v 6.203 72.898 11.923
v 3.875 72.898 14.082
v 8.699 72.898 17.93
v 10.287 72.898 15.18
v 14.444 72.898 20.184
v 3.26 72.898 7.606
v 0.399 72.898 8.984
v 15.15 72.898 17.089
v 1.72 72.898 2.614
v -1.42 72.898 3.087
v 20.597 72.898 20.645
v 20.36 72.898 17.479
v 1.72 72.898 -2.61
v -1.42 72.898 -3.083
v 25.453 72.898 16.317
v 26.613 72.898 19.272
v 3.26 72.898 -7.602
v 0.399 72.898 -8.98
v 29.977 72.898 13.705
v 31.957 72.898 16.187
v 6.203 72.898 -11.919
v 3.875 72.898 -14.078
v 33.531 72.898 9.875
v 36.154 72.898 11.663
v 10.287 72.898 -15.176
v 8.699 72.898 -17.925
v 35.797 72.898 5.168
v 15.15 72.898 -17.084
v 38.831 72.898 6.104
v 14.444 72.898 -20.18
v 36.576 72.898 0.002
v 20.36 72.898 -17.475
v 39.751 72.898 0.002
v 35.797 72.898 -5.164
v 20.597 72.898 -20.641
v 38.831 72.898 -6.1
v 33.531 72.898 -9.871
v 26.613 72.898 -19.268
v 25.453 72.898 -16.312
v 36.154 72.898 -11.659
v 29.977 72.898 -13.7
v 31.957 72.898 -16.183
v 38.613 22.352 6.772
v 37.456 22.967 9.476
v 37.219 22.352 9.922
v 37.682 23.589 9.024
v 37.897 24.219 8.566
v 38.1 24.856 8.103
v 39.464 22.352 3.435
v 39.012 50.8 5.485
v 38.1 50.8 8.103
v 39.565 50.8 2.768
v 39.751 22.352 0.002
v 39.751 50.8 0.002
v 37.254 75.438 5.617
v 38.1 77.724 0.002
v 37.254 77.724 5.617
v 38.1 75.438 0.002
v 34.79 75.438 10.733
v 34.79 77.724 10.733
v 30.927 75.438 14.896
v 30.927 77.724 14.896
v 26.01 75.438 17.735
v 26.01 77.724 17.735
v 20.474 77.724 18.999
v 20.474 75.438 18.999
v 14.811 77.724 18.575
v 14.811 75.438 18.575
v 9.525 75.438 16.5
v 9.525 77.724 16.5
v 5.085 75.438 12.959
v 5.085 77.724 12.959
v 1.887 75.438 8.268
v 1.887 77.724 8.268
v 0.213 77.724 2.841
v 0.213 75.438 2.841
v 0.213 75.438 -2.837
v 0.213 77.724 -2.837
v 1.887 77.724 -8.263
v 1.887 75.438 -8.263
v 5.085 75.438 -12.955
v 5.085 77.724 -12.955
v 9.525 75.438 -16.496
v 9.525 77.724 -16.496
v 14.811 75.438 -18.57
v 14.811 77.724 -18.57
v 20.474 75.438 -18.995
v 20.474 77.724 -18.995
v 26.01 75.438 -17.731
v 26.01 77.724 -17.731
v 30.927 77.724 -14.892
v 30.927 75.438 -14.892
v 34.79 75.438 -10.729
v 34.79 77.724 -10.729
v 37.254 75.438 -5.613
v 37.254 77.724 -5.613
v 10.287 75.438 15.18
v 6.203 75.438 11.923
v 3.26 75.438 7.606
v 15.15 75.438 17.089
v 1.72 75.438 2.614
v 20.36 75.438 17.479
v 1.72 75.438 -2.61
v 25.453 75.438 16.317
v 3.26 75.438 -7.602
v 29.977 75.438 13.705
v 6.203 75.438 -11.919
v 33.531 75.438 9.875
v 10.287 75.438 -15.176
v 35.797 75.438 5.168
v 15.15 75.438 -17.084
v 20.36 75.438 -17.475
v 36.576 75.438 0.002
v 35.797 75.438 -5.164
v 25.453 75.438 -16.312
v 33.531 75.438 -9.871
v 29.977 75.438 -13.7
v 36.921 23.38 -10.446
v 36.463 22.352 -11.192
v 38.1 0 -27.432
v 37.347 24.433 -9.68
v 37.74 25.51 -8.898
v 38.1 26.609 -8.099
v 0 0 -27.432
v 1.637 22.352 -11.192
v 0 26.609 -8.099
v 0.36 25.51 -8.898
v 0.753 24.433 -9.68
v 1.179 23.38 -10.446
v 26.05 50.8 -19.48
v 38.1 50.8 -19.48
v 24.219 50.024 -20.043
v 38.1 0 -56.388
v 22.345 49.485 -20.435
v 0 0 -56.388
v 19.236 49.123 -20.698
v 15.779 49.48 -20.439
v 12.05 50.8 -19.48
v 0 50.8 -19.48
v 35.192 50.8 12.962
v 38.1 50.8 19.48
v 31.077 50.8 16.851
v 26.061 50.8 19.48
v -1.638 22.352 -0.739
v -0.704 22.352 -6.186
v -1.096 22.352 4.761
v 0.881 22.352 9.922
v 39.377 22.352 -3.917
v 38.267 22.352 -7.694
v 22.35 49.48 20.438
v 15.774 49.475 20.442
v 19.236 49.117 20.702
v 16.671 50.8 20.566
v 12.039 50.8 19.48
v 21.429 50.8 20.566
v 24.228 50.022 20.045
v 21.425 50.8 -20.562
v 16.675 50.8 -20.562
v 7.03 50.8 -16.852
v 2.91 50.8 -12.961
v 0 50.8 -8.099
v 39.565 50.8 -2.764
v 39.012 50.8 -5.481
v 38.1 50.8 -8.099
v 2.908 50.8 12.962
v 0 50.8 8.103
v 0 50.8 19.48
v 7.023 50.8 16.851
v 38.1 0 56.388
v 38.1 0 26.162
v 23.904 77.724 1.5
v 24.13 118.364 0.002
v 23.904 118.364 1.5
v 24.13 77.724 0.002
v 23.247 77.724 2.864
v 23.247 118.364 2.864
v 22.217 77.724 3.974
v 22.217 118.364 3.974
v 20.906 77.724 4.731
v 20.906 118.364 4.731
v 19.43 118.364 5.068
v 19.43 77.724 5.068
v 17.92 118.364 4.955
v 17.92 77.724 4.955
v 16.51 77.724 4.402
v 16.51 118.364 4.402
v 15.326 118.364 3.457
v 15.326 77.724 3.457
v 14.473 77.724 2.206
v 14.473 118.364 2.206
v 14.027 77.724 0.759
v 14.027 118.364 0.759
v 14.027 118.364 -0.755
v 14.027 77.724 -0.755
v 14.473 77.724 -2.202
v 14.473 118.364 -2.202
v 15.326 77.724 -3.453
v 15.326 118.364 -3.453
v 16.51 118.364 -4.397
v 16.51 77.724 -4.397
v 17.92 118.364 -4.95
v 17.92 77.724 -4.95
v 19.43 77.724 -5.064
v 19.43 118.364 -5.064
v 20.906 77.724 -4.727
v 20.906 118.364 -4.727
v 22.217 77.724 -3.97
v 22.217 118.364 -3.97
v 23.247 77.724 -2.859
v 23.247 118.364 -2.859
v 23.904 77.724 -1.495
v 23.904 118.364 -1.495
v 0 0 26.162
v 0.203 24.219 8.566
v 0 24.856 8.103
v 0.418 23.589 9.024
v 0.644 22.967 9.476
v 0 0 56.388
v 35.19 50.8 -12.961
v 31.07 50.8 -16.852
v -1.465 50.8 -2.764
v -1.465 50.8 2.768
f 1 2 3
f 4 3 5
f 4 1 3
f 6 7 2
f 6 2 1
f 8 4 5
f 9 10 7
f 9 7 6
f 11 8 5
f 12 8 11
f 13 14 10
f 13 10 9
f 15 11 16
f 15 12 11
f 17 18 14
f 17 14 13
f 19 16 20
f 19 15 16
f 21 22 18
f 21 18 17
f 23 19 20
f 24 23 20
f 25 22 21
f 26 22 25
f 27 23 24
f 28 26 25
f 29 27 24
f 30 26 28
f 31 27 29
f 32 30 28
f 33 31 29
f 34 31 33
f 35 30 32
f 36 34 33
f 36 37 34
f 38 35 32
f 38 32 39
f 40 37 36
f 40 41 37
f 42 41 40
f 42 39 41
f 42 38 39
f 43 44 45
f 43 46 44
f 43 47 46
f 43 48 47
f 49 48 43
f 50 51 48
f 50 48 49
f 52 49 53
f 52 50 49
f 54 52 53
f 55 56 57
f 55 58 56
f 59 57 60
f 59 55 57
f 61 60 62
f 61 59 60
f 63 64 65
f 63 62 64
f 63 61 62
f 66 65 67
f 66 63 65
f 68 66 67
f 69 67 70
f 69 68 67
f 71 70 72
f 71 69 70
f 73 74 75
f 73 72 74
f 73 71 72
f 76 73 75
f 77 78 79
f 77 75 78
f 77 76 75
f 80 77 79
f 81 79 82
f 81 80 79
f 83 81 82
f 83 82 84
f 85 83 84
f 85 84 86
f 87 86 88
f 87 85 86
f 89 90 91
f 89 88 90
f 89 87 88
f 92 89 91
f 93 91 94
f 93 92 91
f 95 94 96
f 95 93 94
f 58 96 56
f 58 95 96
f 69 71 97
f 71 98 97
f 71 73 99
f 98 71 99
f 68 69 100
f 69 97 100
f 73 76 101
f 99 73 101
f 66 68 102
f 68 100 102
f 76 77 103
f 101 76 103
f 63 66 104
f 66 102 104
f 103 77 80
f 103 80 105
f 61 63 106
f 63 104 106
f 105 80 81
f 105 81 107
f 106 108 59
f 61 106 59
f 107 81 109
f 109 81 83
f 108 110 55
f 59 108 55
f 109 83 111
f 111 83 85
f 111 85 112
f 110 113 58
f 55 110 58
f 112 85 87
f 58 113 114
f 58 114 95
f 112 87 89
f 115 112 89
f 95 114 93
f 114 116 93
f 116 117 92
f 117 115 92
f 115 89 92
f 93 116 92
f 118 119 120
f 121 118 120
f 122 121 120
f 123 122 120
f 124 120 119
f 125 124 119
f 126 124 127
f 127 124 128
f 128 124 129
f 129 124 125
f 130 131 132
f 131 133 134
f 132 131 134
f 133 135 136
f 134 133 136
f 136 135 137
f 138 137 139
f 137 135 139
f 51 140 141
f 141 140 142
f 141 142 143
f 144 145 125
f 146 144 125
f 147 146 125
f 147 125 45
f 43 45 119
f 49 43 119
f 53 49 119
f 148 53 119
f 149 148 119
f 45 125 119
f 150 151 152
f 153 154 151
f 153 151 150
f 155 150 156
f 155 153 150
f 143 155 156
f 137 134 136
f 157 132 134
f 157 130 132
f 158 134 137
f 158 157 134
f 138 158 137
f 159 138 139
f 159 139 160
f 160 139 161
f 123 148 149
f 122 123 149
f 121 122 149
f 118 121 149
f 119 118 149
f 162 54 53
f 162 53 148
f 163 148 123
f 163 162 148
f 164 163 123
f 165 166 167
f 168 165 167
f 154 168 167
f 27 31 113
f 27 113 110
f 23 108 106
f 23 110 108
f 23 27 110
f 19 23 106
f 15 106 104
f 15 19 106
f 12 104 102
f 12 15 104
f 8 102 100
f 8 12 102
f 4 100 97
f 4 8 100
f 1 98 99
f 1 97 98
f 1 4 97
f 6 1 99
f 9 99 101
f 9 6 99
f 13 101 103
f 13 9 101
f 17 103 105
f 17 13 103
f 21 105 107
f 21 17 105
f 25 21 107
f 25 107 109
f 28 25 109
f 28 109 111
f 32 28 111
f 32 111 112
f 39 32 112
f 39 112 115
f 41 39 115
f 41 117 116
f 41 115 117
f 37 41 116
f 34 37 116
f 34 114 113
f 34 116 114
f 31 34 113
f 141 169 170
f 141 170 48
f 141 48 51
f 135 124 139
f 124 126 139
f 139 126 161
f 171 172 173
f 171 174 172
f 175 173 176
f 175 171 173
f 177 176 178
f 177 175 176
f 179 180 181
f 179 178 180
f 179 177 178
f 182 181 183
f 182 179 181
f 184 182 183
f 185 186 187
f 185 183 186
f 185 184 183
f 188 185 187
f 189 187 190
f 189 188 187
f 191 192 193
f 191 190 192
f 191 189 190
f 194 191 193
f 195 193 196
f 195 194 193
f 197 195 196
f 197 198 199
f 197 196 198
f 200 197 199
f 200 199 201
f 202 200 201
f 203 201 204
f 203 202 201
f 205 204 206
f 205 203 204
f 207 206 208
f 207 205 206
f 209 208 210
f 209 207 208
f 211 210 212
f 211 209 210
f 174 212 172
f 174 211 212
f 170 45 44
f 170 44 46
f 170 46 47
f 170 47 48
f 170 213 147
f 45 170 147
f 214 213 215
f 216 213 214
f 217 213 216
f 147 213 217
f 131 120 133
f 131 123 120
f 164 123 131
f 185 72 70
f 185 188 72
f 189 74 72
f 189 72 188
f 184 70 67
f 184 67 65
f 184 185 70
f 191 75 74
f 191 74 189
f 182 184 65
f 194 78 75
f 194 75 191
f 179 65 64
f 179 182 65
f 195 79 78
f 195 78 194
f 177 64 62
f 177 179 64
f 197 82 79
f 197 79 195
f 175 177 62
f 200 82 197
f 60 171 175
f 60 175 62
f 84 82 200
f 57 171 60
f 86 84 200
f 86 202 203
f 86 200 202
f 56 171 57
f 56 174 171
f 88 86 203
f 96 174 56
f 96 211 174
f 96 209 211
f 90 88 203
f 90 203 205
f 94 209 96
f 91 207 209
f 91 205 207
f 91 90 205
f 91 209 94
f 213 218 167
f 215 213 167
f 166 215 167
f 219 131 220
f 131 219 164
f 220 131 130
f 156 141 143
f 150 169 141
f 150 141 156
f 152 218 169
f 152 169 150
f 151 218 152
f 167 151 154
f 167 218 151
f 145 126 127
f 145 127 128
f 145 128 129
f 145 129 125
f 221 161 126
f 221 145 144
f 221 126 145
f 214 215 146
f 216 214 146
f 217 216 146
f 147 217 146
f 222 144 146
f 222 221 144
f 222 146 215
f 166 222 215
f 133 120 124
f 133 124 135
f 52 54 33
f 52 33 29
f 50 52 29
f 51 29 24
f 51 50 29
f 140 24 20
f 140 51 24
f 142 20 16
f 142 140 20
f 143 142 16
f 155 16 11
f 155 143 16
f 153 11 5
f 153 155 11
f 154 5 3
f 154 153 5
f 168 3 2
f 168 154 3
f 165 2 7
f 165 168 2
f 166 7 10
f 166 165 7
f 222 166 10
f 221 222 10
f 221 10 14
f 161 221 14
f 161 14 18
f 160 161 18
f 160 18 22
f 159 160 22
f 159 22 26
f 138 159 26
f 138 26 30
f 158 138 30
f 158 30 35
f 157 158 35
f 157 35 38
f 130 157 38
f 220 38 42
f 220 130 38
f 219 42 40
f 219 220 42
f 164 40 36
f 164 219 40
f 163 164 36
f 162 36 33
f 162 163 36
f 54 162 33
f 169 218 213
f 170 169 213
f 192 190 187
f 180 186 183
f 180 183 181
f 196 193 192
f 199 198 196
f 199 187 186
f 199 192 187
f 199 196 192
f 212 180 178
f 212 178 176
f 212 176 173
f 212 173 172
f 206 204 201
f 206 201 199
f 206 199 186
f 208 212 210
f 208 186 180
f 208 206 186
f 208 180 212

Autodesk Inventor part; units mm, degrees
ref_plane "YZ Plane" through (0, 0, 0) normal (1, 0, 0) x (0, 1, 0)
ref_plane "XZ Plane" through (0, 0, 0) normal (0, 1, 0) x (-1, 0, 0)
ref_plane "XY Plane" through (0, 0, 0) normal (0, 0, 1) x (1, 0, 0)
sketch "Sketch3" plane through (0, 0, 0) normal (1, 0, 0) x (0, 1, 0)
  line L0 (0, -27.432) -> (0, -56.388)
  line L1 (0, -56.388) -> (50.8, -19.4796)
  line L2 (50.8, -19.4796) -> (50.8, 9.4764)
  line L3 (7.4884, -44.196) -> (-9.6833, -44.196) construction
  line L4 (0, -27.432) -> (50.8, 9.4764)
  line L5 (0, 56.388) -> (50.8, 19.4796)
  line L6 (50.8, 19.4796) -> (50.8, -10.7464)
  line L7 (0, 56.388) -> (0, 26.162)
  line L8 (0, 26.162) -> (50.8, -10.7464)
  point P0 (0, 0)
  dimension "d23" = 54
  dimension "d25" = 44.196
  dimension "d26" = 16.764
  dimension "d27" = 12.192
  dimension "d28" = 50.8
  dimension "d33" = 0
  dimension "d34" = 54
  dimension "d35" = 50.8
  dimension "d36" = 53.594
  dimension "d37" = 112.776
extrude "Extrusion1" add sketch "Sketch3" along normal blind 38.1
sketch "Sketch5" plane through (0, 50.8, 19.4796) normal (0, 1, 0) x (1, 0, 0)
  circle A0 centre (19.05, 19.4775) radius 20.701
  line L0 (0, 38.9593) -> (38.1, 38.9593) projected
  line L1 (38.1, 38.9593) -> (38.1, 0) projected
  line L2 (0, 0) -> (38.1, 0) projected
  line L3 (38.1, 0) -> (0, 0) projected
  line L4 (0, 0) -> (0, 38.9593) projected
  line L5 (0, 38.9593) -> (38.1, 38.9593) projected
  line L6 (38.1, 38.9593) -> (38.1, 0) projected
  point P0 (0, 19.4796)
  dimension "d40" = 41.402
  dimension "d42" = 19.05
  dimension "d43" = 38.9593
  dimension "d44" = 19.4818
extrude "Extrusion2" add sketch "Sketch5" along normal blind 22.098 contours A0 L1 | L1 A0 L2 L4 L0 | L0 A0 | A0 L2 | L4 A0
extrude "Extrusion3" add sketch "Sketch5" against normal blind 28.448 contours A0 L1 | L1 A0 L2 L4 L0 | L0 A0 | A0 L2 | L4 A0
sketch "Sketch8" plane through (19.05, 72.898, 0.0022) normal (0, 1, 0) x (1, 0, 0)
  circle A0 centre (0, 0) radius 17.526
  circle A1 centre (0, 0) radius 20.701 projected
  point P0 (-19.05, 0.0022)
  dimension "d50" = 35.052
extrude "Extrusion4" add sketch "Sketch8" along normal blind 2.54 contours A0
sketch "Sketch9" plane through (19.05, 75.438, 0.0022) normal (0, 1, 0) x (1, 0, 0)
  circle A0 centre (0, 0) radius 19.05
  circle A1 centre (0, 0) radius 17.526 projected
  point P0 (-19.05, 0.0022)
  dimension "d53" = 38.1
extrude "Extrusion5" add sketch "Sketch9" along normal blind 2.286 contours A0 | A1
sketch "Sketch10" plane through (19.05, 77.724, 0.0022) normal (0, 1, 0) x (1, 0, 0)
  circle A0 centre (0, 0) radius 5.08
  circle A1 centre (0, 0) radius 19.05 projected
  point P0 (-19.05, 0.0022)
  dimension "d56" = 10.16
extrude "Extrusion6" add sketch "Sketch10" along normal blind 40.64 contours A0
properties part number "gear mount"
